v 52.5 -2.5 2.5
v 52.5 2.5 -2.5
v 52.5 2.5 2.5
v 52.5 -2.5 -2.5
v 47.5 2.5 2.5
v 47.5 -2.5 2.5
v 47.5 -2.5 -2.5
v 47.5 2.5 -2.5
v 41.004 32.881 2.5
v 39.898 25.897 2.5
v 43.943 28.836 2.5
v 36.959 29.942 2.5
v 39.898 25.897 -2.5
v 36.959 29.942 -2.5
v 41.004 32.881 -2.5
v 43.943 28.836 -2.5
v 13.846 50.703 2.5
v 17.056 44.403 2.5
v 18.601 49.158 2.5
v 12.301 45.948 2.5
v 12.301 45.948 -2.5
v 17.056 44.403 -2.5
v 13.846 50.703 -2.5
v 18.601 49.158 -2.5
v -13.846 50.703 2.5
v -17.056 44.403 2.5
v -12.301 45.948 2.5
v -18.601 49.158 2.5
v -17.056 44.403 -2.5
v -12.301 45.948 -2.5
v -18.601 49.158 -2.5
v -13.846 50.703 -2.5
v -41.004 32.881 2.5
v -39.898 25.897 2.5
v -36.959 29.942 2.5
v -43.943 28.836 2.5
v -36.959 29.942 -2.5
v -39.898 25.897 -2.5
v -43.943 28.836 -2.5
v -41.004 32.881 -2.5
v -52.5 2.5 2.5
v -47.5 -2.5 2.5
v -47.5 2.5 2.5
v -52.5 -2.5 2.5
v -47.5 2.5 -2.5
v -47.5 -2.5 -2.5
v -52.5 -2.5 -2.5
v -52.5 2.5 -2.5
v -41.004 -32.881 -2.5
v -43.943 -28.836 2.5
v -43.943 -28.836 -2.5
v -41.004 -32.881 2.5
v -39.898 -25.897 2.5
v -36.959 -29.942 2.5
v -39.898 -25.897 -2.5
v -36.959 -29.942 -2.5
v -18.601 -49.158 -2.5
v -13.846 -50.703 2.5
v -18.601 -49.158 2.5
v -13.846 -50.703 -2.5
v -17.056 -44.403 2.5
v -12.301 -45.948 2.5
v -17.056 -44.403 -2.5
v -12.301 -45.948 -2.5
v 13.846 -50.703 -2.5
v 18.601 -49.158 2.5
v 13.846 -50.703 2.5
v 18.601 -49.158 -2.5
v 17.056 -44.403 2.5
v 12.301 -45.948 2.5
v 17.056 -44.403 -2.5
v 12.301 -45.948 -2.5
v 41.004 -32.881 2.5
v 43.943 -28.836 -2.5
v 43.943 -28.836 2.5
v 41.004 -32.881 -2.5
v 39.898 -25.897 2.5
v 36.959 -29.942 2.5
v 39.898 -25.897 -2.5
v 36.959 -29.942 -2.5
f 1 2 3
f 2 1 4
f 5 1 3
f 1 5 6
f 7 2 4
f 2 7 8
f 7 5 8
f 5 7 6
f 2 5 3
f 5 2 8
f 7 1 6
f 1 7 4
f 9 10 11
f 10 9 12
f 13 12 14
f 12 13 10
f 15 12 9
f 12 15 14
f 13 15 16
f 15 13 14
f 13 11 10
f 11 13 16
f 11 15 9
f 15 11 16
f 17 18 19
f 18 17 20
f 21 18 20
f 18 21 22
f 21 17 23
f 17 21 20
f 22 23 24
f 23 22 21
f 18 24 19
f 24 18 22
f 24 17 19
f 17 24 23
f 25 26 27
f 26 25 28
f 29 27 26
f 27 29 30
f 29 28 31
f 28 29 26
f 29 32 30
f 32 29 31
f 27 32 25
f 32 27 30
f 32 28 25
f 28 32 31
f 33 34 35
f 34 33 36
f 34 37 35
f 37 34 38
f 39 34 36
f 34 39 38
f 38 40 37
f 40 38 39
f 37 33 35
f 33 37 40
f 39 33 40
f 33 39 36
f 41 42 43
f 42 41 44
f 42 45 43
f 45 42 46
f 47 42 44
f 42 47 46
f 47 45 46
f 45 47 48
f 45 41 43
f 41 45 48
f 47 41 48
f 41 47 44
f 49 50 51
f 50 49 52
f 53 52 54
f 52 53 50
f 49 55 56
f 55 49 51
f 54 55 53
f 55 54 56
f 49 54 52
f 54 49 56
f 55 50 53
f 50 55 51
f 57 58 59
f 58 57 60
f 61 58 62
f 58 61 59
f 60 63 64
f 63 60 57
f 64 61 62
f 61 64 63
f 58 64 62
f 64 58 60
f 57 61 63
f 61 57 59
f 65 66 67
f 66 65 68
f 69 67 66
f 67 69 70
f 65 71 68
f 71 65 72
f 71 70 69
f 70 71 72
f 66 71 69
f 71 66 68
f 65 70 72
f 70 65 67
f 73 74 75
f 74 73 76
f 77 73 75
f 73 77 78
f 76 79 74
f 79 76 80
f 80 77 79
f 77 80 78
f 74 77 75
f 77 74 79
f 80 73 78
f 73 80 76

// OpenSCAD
/*
for(i = [0:10]){
    echo(i);
    translate([i*20,0,0])
    cube(size = i, center = true);
    }
    */
 
/* 
    //ice cream cone
    rotate([180,0,0])
    cylinder(r1 = 10,r2 = 0,  center = false, $fn = 100, h = 70);
    
    //scoops
    scoops = 30;
    
    for(n = [0:scoops - 1]){
        translate([0,0,n*15])
        sphere(r = 11, $fn = 100);
        }
        
 */
 
 var = 10;
 
 for(q = [0:var-1]){
     rotate([0,0,360/var*q])
     translate([50,0,0])
     cube(size = 5, center =  true);
     }
    
    
    
    
    
    
